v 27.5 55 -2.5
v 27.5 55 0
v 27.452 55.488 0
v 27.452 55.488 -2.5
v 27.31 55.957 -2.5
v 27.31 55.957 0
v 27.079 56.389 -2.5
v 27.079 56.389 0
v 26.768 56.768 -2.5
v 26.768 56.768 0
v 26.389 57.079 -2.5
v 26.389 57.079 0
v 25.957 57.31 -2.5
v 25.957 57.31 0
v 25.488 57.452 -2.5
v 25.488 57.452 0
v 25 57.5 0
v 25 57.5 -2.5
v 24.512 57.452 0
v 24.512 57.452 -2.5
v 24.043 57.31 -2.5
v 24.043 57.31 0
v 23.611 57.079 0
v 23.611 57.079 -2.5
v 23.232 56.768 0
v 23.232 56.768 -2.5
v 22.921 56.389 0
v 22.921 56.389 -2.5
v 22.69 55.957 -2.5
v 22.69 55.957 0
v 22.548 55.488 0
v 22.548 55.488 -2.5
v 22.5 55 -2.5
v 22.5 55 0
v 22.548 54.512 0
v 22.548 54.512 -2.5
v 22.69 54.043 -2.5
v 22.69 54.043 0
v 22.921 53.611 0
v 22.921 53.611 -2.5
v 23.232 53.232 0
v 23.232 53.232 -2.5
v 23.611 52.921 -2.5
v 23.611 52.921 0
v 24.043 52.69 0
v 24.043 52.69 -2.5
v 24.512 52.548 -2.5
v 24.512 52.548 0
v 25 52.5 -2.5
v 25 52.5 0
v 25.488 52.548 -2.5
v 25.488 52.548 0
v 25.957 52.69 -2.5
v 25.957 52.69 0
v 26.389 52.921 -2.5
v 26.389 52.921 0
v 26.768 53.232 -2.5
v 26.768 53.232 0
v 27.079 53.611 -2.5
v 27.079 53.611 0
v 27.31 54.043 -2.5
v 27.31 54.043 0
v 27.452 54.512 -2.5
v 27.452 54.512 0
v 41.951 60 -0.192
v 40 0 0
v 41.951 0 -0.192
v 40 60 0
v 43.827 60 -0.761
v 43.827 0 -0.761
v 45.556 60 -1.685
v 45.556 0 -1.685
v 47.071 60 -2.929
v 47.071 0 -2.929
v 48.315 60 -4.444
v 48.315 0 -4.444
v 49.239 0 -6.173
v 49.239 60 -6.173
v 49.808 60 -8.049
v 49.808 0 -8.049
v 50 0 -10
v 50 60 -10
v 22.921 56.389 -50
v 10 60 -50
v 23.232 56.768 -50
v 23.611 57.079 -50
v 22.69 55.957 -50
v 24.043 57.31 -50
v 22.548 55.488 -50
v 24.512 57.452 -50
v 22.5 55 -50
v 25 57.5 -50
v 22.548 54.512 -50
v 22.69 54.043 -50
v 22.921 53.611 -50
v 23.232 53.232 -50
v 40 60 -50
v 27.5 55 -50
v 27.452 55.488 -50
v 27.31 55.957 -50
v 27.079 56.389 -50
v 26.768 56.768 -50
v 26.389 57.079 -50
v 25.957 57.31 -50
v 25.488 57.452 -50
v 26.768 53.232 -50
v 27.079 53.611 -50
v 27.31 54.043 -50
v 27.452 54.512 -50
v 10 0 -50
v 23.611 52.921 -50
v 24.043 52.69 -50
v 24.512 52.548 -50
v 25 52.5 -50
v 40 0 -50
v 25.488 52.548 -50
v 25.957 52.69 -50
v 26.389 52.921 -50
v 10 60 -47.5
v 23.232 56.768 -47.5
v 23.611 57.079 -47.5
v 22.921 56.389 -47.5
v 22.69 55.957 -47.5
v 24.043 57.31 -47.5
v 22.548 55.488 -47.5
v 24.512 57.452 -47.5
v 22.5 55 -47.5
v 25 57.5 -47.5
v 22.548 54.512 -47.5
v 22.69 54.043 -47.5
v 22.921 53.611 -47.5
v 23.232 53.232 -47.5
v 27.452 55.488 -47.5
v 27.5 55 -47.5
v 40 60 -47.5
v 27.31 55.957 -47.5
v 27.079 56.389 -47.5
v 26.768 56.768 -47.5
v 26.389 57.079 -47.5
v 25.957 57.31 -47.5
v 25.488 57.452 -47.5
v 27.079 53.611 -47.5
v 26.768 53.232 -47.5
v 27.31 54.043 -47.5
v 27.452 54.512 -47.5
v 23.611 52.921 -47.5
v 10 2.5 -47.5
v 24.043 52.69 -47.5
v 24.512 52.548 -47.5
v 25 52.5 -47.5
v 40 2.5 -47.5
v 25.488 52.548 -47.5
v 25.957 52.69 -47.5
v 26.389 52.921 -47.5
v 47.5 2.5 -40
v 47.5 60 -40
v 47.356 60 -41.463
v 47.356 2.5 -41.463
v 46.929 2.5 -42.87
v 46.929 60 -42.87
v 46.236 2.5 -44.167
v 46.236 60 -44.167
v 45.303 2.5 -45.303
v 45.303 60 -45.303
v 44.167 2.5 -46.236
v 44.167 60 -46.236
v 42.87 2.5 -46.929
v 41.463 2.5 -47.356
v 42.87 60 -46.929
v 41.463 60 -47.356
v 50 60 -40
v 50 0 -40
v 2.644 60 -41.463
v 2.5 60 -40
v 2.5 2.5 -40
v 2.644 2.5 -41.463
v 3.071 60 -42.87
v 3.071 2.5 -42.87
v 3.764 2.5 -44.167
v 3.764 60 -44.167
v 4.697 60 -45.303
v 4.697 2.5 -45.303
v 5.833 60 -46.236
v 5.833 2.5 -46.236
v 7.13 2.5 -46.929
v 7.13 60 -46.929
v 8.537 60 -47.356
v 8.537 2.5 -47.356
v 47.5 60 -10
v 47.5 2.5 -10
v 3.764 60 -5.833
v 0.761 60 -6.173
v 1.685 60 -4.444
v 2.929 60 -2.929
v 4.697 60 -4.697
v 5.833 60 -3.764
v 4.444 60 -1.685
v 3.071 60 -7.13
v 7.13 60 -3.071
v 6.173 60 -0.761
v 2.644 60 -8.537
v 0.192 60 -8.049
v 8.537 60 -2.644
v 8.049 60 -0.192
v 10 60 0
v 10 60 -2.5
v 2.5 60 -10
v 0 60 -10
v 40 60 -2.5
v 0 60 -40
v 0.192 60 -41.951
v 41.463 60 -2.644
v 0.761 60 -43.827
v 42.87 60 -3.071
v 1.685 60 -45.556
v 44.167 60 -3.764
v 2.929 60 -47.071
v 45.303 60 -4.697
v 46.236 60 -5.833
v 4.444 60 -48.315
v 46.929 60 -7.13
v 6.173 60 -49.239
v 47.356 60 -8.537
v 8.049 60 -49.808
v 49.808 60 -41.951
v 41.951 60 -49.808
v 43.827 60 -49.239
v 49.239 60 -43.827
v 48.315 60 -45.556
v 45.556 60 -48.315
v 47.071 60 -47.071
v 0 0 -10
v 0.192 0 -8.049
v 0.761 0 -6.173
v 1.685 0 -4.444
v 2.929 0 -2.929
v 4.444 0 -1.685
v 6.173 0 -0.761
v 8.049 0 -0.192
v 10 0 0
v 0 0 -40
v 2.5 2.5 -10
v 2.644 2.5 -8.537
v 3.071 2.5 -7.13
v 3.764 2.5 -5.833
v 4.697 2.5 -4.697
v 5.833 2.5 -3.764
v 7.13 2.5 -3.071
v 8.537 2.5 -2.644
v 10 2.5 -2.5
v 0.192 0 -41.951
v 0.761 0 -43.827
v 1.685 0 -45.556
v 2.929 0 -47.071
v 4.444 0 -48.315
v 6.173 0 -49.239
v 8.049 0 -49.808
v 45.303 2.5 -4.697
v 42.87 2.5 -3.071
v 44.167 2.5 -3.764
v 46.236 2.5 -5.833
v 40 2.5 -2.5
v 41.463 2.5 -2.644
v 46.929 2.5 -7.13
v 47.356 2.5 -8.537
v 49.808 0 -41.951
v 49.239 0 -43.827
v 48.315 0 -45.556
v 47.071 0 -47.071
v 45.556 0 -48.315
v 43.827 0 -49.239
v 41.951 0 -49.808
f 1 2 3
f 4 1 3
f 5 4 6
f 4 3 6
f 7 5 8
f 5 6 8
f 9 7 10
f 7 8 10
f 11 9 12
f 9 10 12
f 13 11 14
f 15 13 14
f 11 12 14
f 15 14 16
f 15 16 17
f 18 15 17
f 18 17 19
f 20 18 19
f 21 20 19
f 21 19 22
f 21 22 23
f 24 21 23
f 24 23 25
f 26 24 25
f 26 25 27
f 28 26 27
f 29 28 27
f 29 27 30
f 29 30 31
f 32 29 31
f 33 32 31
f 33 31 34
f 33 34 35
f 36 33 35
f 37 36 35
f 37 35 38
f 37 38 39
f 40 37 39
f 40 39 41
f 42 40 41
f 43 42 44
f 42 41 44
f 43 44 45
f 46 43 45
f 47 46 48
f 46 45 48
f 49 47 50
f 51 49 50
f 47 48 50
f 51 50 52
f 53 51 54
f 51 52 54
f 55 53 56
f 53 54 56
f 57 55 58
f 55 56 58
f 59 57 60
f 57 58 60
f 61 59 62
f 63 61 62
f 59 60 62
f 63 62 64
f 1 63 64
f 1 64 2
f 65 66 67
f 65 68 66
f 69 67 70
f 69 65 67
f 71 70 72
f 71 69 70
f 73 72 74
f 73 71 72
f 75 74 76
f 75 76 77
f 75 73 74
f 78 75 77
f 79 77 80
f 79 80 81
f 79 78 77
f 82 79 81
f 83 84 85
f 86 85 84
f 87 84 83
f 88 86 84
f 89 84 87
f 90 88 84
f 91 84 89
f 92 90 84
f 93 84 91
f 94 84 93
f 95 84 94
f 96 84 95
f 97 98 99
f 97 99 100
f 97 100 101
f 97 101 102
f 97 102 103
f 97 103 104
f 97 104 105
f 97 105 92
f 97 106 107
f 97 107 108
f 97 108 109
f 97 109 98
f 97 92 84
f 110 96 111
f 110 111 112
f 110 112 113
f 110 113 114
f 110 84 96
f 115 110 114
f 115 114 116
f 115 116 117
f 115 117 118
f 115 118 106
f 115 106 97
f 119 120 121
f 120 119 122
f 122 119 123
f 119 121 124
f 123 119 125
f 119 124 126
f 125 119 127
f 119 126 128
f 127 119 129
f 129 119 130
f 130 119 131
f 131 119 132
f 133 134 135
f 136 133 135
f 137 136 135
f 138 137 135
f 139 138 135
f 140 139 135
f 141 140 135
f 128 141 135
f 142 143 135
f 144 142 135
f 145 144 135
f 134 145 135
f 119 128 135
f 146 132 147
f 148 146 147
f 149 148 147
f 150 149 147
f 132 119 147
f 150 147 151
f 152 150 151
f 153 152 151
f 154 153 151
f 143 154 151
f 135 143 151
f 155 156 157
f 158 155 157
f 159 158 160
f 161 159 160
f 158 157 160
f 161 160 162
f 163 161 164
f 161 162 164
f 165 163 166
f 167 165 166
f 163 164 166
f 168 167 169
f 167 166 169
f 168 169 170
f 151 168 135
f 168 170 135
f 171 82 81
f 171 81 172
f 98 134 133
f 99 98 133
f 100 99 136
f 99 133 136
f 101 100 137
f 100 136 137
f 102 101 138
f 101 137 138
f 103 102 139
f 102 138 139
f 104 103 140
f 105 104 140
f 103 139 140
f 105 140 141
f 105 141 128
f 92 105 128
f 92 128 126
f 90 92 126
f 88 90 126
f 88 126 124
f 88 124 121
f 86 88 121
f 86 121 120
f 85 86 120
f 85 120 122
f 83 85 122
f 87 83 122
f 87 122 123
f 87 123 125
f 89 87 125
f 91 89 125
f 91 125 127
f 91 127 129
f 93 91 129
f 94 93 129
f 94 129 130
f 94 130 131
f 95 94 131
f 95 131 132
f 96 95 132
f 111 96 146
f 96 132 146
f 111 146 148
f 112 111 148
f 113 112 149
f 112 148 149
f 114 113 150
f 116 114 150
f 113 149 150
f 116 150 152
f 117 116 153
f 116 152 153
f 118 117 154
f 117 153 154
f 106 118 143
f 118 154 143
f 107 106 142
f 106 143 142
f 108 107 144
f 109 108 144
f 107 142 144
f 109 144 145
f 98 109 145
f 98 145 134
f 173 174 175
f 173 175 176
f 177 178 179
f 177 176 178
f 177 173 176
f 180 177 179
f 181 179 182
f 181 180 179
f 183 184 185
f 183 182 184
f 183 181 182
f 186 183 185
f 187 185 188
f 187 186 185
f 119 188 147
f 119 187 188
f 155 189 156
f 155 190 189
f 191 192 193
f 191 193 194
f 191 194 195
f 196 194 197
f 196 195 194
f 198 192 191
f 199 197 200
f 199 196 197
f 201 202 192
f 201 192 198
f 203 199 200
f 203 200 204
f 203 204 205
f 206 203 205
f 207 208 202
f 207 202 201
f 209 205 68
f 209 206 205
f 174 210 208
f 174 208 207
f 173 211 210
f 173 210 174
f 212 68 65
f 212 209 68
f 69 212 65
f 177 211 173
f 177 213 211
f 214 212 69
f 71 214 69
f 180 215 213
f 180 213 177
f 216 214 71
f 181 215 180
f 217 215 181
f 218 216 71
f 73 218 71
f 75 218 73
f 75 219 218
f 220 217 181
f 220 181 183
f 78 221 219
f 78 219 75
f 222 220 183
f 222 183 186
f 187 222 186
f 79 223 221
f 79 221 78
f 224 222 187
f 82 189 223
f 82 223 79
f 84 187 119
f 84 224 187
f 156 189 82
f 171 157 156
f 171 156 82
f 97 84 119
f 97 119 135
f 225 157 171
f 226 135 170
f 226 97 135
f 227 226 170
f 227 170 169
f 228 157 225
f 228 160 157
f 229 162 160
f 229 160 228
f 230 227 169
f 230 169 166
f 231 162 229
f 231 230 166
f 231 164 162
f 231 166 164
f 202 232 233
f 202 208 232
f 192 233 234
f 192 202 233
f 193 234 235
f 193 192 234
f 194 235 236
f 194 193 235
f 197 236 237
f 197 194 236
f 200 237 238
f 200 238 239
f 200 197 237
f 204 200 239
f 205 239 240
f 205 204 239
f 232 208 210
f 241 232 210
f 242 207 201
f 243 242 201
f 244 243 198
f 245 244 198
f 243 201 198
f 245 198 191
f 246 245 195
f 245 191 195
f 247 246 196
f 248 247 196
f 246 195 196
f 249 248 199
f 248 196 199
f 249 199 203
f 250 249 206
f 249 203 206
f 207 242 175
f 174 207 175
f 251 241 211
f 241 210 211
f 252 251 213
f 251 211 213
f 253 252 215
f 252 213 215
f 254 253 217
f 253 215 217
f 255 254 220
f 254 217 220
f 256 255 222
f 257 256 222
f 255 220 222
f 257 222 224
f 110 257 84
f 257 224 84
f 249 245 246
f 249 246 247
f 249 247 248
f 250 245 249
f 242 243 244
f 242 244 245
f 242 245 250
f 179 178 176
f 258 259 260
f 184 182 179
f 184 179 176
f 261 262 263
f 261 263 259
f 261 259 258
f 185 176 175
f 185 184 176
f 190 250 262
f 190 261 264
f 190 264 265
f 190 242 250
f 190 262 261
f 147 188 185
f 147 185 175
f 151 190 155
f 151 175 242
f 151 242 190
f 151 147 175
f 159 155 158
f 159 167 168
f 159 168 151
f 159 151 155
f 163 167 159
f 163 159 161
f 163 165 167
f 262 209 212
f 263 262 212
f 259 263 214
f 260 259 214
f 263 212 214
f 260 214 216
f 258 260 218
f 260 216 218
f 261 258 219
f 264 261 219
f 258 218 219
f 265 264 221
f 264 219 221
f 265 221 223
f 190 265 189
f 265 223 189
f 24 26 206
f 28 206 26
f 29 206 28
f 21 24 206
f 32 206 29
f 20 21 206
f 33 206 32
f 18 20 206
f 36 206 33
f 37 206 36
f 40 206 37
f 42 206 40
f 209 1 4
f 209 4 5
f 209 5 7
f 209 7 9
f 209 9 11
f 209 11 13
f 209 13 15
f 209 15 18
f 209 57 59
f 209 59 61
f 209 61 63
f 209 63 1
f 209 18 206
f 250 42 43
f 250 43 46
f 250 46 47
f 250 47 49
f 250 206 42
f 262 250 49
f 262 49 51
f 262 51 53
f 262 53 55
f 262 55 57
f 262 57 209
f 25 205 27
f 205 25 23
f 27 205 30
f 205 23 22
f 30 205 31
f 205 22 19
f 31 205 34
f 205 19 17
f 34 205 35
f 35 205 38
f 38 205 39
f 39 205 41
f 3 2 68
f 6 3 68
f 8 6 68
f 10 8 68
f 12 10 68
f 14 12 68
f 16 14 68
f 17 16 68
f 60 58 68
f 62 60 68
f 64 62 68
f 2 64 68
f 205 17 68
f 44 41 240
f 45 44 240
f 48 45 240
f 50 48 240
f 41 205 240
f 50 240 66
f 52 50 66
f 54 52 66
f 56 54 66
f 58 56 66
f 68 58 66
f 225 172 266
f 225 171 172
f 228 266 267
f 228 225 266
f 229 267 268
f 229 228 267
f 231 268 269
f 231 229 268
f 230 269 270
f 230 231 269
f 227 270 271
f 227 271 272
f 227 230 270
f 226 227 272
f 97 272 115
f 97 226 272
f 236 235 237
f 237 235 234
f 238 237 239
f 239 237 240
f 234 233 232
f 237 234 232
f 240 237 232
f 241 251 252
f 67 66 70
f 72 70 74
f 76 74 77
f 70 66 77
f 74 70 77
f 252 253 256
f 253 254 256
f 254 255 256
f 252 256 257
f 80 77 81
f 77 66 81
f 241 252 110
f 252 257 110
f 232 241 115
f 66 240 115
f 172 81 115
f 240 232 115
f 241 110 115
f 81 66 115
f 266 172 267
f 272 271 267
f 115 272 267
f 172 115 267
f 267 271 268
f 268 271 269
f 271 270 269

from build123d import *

# Parameters (mm, degrees)
SKETCH1_W           = 50
SKETCH1_H           = 50
BOSS_EXTRUDE1_DEPTH = 60
FILLET1_R           = 10
SHELL1_T            = -2.5
SKETCH2_R           = 2.5
CUT_EXTRUDE1_DEPTH  = 93.736184955


with BuildPart() as part:
    # Sketch1 → Boss-Extrude1 (new body)
    with BuildSketch(Plane(origin=(0, 0, 0), x_dir=(1, 0, 0), z_dir=(0, 1, 0))):
        with Locations((25, 25)):
            Rectangle(SKETCH1_W, SKETCH1_H)
    extrude(amount=BOSS_EXTRUDE1_DEPTH)

    # Fillet1
    fillet1_edges = [part.edges().sort_by_distance(p)[0] for p in [
        (0, 30, -50),
        (50, 30, -50),
        (50, 30, 0),
        (0, 30, 0),
    ]]
    fillet(fillet1_edges, radius=FILLET1_R)

    # Shell1
    shell1_openings = [part.faces().sort_by_distance(p)[0] for p in [
        (25, 60, -25),
    ]]
    offset(amount=SHELL1_T, openings=shell1_openings, kind=Kind.INTERSECTION)

    # Sketch2 → Cut-Extrude1 (cut, through all)
    with BuildSketch(Plane.XY):
        with Locations((25, 55)):
            Circle(SKETCH2_R)
    extrude(amount=-CUT_EXTRUDE1_DEPTH, mode=Mode.SUBTRACT)


solid = part.part
